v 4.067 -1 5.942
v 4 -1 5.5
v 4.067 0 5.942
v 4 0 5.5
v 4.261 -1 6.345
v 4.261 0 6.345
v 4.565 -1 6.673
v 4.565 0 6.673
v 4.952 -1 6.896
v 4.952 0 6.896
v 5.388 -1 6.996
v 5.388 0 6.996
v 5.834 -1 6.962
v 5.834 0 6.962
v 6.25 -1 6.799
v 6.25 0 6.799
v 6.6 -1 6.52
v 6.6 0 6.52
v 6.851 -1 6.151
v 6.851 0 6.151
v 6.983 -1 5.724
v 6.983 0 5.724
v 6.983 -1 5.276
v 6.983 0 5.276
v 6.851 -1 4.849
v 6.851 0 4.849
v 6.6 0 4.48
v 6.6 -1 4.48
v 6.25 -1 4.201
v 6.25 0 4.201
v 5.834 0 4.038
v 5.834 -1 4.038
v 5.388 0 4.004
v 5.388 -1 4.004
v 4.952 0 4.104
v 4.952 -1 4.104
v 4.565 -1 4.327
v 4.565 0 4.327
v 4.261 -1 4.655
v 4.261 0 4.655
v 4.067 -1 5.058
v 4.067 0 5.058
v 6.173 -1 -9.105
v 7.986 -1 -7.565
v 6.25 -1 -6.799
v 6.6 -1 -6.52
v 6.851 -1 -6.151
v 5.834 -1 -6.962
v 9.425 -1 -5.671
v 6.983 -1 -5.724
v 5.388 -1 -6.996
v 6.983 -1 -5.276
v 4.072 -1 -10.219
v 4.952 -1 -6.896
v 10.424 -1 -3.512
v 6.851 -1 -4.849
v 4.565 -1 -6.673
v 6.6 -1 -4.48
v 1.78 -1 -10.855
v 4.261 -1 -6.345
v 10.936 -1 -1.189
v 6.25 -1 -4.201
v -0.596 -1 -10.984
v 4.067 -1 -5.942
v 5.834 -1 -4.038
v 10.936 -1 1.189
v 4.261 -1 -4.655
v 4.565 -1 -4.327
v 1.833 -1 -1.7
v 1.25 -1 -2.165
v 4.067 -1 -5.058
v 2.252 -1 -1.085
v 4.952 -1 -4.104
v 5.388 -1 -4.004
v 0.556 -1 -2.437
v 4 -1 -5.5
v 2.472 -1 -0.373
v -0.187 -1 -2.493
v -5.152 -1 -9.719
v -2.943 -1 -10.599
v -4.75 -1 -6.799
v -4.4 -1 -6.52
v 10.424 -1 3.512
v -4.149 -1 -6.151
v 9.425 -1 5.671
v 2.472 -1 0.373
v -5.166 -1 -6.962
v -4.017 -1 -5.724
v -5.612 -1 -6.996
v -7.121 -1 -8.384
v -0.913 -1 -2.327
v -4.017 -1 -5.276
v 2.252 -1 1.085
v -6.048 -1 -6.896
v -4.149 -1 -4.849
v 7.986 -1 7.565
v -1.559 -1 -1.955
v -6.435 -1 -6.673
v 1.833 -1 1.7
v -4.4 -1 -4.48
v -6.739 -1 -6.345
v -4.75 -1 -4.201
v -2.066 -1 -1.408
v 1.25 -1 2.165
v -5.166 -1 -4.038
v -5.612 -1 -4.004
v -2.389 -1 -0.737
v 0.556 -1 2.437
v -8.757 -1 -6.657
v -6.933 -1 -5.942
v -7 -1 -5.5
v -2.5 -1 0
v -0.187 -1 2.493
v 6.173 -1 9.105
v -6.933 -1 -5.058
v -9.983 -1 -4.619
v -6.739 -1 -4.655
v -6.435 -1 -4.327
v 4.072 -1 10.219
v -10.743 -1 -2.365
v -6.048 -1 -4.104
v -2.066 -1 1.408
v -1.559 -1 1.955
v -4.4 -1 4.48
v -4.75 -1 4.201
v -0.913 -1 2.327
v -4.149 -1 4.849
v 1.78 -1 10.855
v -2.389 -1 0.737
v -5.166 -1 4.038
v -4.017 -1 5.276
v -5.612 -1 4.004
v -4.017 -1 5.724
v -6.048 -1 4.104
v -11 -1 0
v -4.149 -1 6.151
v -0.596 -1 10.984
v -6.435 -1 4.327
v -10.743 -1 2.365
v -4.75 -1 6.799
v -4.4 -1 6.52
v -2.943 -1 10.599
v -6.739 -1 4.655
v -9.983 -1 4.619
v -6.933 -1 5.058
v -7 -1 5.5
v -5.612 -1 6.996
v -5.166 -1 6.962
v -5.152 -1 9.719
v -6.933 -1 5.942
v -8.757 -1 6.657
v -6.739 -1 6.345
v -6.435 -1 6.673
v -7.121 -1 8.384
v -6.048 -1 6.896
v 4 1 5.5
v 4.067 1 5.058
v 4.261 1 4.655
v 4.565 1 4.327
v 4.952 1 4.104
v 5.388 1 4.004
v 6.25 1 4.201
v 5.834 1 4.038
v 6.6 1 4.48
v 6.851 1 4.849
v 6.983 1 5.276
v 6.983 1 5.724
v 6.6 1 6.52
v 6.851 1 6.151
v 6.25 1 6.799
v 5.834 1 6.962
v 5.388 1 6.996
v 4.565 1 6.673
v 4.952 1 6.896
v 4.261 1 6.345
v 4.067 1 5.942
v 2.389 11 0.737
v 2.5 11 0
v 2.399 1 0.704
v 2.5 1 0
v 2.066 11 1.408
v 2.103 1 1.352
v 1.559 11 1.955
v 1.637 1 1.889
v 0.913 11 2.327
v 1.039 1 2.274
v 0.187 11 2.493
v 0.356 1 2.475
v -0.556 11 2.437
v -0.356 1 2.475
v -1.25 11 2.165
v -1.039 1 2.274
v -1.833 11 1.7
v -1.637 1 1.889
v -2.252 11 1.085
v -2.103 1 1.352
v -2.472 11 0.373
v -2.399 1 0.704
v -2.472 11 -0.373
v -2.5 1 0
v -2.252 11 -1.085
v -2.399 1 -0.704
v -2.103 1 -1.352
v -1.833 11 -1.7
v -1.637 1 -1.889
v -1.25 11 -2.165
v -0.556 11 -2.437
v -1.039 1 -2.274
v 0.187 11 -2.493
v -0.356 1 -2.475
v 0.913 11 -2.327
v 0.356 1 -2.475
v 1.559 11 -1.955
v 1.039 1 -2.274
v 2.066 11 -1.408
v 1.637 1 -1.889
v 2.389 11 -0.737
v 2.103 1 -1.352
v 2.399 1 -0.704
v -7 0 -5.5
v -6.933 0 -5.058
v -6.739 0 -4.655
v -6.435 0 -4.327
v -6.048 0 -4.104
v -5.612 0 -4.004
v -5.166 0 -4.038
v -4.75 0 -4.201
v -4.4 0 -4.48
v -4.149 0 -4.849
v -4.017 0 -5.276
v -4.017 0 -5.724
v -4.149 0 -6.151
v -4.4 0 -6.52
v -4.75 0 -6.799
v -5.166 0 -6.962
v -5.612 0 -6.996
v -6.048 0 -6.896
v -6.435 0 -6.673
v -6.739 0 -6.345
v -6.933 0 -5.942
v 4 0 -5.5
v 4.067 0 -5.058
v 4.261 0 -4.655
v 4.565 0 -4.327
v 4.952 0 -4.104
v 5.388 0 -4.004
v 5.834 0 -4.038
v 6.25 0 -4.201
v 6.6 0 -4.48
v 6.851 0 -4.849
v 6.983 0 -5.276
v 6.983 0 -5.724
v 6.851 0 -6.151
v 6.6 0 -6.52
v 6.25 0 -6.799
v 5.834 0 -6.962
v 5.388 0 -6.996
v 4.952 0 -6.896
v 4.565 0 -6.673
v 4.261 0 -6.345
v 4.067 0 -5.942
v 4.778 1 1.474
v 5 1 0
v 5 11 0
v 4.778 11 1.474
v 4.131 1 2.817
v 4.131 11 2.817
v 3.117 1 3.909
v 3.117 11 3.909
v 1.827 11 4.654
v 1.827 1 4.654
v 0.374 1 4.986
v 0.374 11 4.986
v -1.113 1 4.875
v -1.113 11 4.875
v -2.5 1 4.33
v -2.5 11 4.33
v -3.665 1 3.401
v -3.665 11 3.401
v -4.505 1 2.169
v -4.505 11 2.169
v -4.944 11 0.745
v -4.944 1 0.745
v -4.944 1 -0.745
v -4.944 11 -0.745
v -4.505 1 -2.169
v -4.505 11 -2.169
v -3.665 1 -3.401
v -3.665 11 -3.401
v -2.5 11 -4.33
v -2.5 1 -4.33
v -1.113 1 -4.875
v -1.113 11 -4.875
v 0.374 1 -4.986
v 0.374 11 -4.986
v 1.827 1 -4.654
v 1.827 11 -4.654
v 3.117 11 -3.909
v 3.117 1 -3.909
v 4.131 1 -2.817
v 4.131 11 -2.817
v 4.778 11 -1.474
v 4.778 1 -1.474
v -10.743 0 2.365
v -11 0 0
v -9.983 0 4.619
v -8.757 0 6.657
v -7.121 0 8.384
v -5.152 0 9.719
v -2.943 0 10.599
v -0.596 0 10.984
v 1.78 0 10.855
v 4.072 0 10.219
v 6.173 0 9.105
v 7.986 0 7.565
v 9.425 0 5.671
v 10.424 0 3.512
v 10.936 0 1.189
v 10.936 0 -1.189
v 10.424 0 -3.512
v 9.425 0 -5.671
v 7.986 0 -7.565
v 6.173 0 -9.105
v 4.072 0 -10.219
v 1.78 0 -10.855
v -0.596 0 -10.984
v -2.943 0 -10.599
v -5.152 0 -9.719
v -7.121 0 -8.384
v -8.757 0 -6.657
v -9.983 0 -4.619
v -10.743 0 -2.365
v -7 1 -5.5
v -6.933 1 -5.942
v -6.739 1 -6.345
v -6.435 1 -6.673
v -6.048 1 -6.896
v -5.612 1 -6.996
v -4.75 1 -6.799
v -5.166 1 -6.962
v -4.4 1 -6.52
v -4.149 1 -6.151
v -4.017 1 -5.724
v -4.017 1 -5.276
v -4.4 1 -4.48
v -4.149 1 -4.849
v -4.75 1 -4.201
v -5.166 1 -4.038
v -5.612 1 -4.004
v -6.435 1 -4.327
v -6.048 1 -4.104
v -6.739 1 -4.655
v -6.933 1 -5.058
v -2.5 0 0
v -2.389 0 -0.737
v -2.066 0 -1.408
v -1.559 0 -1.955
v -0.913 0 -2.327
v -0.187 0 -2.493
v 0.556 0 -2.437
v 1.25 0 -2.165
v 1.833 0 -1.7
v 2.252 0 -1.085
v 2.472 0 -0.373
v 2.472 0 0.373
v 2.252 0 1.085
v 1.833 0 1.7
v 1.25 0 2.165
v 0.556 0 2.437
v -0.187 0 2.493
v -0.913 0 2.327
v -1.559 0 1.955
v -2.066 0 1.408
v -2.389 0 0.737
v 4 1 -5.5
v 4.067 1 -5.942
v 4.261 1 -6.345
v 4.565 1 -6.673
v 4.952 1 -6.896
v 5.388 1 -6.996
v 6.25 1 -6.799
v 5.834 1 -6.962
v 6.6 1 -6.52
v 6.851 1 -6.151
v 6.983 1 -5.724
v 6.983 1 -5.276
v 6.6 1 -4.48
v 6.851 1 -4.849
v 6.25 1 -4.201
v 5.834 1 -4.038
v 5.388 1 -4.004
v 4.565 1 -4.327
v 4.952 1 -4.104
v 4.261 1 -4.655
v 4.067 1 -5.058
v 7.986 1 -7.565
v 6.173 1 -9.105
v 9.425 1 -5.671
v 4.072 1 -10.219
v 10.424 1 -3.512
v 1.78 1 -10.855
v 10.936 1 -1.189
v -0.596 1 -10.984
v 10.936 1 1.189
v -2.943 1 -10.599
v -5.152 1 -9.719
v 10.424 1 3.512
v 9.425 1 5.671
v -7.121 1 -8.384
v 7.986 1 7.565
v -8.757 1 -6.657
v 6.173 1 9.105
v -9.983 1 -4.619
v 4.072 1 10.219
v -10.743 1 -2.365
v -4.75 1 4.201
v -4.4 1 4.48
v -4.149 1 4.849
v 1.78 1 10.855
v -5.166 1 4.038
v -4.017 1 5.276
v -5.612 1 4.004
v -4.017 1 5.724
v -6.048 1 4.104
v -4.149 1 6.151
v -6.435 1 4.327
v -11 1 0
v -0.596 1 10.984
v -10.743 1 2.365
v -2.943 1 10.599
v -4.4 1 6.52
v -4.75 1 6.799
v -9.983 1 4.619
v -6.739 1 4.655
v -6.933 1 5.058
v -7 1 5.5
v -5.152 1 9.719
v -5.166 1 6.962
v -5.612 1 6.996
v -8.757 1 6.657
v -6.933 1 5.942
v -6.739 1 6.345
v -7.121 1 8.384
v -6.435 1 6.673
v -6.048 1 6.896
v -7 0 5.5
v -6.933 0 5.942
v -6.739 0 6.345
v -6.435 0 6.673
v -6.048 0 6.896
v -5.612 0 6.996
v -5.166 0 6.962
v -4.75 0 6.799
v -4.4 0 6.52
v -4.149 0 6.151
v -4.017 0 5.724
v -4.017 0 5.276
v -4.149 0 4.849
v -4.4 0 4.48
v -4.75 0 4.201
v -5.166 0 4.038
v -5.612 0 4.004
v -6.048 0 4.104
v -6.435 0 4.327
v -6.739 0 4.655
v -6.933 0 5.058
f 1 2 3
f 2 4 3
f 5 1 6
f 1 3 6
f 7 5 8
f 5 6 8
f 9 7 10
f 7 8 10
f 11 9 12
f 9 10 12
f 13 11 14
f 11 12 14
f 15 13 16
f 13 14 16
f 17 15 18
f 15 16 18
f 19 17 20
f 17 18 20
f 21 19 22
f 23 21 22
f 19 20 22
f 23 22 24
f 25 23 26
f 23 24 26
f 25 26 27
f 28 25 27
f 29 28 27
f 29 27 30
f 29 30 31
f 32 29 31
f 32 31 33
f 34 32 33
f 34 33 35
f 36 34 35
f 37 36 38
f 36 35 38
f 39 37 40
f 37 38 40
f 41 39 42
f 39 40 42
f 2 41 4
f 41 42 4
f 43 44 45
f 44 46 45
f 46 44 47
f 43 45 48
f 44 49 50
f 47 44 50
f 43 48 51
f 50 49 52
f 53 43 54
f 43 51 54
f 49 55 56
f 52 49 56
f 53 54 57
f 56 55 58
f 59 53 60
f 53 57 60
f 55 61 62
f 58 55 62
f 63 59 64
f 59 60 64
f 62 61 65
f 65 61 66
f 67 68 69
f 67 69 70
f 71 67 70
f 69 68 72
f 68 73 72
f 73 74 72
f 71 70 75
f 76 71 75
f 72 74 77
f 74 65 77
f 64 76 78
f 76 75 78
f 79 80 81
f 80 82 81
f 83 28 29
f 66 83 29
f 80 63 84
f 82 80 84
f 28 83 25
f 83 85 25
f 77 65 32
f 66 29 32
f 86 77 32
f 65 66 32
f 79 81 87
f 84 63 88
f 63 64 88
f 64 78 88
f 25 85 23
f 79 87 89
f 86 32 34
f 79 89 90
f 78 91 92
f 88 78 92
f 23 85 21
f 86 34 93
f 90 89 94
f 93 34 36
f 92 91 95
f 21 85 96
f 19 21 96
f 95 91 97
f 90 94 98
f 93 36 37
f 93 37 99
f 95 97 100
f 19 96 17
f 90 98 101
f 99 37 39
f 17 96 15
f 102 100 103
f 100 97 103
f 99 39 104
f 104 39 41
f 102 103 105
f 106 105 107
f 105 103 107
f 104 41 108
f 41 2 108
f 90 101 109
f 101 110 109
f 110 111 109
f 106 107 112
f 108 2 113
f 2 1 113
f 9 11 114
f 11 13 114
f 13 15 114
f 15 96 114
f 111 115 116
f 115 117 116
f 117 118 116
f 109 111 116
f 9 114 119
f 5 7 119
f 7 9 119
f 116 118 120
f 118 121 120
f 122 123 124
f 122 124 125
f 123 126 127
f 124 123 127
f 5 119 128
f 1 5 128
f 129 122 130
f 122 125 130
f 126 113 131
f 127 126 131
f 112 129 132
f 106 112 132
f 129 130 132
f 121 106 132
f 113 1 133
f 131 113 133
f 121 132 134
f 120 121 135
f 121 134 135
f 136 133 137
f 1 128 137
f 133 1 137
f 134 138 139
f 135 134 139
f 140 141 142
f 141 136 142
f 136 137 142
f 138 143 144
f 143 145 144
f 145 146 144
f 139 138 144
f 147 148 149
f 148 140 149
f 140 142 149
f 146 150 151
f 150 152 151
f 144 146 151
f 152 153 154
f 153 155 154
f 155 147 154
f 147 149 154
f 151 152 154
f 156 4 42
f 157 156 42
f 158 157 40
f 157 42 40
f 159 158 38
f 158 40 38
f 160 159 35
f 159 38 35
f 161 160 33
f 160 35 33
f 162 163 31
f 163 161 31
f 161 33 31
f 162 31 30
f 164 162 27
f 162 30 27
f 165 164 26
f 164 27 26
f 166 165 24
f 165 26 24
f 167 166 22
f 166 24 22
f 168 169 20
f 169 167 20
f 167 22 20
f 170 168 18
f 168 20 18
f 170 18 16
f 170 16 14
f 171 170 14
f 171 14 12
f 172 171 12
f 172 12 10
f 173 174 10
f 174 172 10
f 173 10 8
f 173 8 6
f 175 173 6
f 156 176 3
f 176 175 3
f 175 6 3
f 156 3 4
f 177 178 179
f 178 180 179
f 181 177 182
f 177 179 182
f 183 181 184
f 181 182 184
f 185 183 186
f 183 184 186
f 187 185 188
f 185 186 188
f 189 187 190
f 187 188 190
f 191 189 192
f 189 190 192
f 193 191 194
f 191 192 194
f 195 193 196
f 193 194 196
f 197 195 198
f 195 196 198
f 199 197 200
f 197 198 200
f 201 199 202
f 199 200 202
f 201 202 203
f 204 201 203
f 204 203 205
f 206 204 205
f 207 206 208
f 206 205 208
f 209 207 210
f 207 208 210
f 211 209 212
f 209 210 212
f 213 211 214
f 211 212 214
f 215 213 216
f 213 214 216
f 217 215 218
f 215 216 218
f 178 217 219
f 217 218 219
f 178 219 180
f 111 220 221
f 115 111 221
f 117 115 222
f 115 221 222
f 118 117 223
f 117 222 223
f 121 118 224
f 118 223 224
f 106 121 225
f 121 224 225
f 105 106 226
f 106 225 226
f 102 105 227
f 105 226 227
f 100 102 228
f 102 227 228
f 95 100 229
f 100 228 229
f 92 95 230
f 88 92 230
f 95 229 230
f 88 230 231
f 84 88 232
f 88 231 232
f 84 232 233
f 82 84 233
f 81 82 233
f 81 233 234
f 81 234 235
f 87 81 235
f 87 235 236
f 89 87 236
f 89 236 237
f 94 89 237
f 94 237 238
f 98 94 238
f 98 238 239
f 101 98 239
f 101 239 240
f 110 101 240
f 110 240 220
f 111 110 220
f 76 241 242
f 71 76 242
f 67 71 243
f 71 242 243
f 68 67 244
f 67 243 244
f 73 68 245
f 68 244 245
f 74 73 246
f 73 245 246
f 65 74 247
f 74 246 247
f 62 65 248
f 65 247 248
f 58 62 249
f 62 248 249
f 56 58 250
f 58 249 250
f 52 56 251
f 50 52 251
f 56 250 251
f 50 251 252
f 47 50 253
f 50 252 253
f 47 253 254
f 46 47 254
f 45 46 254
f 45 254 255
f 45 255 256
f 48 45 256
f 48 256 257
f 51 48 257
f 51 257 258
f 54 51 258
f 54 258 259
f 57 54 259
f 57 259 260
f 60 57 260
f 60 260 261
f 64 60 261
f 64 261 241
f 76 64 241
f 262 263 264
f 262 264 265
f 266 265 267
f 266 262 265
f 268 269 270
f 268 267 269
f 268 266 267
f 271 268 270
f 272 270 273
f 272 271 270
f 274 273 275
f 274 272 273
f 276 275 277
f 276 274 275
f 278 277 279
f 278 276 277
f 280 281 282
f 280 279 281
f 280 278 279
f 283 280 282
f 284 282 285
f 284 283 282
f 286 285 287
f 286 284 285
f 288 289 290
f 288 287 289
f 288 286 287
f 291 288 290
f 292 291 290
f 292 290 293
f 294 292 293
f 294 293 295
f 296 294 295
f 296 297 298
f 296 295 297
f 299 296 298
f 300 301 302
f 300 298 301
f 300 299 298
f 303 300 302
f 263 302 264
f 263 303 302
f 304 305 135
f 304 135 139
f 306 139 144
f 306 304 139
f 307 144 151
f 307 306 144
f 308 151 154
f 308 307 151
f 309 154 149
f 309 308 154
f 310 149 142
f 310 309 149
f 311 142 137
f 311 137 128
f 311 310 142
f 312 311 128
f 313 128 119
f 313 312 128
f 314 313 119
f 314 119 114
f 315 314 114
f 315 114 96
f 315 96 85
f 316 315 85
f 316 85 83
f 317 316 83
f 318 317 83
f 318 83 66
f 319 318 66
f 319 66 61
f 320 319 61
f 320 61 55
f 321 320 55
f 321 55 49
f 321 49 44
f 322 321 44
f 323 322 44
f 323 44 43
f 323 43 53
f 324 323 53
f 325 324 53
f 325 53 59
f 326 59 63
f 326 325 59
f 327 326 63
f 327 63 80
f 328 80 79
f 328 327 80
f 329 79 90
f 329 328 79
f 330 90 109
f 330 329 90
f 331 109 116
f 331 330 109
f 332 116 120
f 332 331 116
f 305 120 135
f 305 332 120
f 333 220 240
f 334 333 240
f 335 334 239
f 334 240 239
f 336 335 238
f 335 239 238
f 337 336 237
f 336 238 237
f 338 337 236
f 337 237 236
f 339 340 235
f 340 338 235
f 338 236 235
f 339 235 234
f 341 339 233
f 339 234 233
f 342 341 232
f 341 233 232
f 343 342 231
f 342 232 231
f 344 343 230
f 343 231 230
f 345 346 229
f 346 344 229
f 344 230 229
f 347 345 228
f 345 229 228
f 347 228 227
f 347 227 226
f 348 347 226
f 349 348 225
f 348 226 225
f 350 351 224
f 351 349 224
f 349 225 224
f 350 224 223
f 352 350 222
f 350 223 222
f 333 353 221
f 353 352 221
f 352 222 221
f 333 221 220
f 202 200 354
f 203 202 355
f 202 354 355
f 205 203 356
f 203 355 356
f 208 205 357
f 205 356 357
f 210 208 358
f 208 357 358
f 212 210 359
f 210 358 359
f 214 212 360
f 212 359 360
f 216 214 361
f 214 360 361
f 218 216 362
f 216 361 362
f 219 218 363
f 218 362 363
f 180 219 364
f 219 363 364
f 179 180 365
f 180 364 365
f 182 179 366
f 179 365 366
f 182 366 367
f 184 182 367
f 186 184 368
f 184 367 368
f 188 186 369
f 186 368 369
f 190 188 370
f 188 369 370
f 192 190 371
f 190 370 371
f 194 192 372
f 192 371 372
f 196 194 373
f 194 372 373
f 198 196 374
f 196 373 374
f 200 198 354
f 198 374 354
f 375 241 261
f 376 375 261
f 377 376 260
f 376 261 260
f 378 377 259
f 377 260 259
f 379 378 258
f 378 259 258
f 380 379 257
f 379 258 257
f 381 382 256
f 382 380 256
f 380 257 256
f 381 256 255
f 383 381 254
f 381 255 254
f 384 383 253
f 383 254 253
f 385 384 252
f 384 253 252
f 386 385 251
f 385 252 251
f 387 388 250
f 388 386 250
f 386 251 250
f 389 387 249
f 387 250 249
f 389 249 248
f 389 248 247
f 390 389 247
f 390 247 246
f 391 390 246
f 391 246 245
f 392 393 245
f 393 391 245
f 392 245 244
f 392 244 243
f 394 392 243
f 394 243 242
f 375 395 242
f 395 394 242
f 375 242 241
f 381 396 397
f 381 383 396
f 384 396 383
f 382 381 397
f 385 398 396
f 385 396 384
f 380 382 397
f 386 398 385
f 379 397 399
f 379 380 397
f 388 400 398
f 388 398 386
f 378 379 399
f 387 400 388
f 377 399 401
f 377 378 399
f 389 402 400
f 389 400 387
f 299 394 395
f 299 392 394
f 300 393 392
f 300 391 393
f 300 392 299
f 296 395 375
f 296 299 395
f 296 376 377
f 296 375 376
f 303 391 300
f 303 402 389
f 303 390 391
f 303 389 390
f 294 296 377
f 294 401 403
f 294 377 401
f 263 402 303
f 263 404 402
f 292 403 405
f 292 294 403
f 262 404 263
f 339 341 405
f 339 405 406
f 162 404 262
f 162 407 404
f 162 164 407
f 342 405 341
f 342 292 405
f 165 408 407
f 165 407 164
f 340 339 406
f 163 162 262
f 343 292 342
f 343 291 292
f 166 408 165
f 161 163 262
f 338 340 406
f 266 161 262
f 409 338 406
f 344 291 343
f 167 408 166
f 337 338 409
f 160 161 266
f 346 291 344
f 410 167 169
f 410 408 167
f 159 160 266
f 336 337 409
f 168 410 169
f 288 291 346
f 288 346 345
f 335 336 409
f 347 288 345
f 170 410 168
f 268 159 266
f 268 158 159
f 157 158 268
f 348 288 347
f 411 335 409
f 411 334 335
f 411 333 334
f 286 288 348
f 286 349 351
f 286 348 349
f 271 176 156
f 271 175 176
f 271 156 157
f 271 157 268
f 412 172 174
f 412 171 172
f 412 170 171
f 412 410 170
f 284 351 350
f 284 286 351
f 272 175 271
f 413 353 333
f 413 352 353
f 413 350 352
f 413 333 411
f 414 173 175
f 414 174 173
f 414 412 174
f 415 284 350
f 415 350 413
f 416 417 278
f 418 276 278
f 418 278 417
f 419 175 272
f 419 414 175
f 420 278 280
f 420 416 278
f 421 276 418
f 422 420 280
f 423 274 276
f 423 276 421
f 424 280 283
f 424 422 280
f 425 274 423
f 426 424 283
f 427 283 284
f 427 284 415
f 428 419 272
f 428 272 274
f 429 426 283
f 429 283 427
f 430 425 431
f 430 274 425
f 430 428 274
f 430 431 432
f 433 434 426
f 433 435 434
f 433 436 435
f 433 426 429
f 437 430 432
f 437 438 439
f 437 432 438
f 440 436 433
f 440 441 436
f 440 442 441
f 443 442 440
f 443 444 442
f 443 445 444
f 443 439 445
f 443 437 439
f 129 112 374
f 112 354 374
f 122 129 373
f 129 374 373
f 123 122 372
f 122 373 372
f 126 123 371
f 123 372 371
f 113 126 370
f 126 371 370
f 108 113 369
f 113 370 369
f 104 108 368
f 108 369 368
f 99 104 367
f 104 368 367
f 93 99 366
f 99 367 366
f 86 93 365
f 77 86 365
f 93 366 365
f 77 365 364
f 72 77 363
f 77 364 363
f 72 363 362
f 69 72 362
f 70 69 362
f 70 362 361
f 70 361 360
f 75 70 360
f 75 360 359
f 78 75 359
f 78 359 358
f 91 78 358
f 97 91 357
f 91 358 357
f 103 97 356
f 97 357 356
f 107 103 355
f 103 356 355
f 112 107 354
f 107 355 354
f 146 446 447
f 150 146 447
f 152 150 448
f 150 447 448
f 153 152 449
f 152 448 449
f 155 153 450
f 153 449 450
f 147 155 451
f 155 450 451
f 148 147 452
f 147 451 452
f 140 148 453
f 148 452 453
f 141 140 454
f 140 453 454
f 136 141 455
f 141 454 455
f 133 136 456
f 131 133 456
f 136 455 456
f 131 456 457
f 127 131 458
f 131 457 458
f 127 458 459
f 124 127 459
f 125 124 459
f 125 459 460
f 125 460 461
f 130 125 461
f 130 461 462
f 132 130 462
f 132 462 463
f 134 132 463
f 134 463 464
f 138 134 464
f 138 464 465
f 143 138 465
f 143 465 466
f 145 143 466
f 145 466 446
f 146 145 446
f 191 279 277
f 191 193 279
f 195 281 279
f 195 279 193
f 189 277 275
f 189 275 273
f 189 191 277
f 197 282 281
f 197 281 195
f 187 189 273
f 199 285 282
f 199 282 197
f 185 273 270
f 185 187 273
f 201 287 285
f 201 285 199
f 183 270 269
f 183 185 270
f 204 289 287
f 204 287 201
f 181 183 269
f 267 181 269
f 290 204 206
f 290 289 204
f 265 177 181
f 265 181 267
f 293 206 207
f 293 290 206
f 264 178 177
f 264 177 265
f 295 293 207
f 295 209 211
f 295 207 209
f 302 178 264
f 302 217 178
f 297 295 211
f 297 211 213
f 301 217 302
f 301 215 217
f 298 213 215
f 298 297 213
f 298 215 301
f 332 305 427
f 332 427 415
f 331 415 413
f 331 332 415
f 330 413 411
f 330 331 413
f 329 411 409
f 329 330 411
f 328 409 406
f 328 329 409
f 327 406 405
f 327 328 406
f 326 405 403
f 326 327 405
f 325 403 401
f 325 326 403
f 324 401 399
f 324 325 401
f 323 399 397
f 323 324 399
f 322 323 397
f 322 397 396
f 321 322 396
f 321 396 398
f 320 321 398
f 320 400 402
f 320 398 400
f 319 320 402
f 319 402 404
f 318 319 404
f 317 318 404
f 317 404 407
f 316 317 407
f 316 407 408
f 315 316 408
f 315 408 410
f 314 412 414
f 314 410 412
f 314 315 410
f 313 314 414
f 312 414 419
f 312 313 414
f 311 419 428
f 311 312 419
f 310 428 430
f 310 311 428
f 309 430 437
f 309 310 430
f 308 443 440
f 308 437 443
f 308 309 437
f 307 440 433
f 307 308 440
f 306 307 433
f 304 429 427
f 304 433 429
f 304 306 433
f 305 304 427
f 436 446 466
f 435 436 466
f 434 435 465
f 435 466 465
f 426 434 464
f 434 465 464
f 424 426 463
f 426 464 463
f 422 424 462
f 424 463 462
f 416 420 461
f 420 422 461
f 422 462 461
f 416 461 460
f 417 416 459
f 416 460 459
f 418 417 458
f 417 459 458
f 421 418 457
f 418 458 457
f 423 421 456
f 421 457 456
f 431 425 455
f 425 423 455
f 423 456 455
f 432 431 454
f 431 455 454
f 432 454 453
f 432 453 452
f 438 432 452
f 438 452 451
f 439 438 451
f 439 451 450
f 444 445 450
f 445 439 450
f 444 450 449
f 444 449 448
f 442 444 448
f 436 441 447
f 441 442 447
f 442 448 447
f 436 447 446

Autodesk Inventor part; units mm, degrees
sketch "Эскиз1" plane through (0, 0, 0) normal (0, 1, 0) x (-1, 0, 0)
  circle A0 centre (0, 0) radius 11
  circle A1 centre (5.5, -5.5) radius 1.5
  circle A2 centre (5.5, 5.5) radius 1.5
  circle A3 centre (-5.5, 5.5) radius 1.5
  circle A4 centre (-5.5, -5.5) radius 1.5
  line L0 (5.5, -5.5) -> (-5.5, -5.5) construction
  line L1 (-5.5, -5.5) -> (-5.5, 5.5) construction
  line L2 (-5.5, 5.5) -> (5.5, 5.5) construction
  line L3 (5.5, 5.5) -> (5.5, -5.5) construction
  line L4 (5.5, -5.5) -> (-5.5, 5.5) construction
  line L5 (-5.5, -5.5) -> (5.5, 5.5) construction
  circle A5 centre (0, 0) radius 2.5
  dimension "d0" = 22
  dimension "d1" = 3
  dimension "d2" = 11
  dimension "d5" = 5
extrude "Выдавливание1" add sketch "Эскиз1" along normal mid plane 2
sketch "Эскиз2" plane through (0, 1, 0) normal (0, 1, 0) x (1, 0, 0)
  circle A0 centre (0, 0) radius 5
  circle A1 centre (0, 0) radius 2.5 projected
  dimension "d6" = 10
extrude "Выдавливание2" add sketch "Эскиз2" along normal blind 10
ref_plane "РабПлоскость1" through (0, 0, 0) normal (0.7071, 0, -0.7071) x (0, 1, 0)
properties part number "Фланцевая_муфта"
